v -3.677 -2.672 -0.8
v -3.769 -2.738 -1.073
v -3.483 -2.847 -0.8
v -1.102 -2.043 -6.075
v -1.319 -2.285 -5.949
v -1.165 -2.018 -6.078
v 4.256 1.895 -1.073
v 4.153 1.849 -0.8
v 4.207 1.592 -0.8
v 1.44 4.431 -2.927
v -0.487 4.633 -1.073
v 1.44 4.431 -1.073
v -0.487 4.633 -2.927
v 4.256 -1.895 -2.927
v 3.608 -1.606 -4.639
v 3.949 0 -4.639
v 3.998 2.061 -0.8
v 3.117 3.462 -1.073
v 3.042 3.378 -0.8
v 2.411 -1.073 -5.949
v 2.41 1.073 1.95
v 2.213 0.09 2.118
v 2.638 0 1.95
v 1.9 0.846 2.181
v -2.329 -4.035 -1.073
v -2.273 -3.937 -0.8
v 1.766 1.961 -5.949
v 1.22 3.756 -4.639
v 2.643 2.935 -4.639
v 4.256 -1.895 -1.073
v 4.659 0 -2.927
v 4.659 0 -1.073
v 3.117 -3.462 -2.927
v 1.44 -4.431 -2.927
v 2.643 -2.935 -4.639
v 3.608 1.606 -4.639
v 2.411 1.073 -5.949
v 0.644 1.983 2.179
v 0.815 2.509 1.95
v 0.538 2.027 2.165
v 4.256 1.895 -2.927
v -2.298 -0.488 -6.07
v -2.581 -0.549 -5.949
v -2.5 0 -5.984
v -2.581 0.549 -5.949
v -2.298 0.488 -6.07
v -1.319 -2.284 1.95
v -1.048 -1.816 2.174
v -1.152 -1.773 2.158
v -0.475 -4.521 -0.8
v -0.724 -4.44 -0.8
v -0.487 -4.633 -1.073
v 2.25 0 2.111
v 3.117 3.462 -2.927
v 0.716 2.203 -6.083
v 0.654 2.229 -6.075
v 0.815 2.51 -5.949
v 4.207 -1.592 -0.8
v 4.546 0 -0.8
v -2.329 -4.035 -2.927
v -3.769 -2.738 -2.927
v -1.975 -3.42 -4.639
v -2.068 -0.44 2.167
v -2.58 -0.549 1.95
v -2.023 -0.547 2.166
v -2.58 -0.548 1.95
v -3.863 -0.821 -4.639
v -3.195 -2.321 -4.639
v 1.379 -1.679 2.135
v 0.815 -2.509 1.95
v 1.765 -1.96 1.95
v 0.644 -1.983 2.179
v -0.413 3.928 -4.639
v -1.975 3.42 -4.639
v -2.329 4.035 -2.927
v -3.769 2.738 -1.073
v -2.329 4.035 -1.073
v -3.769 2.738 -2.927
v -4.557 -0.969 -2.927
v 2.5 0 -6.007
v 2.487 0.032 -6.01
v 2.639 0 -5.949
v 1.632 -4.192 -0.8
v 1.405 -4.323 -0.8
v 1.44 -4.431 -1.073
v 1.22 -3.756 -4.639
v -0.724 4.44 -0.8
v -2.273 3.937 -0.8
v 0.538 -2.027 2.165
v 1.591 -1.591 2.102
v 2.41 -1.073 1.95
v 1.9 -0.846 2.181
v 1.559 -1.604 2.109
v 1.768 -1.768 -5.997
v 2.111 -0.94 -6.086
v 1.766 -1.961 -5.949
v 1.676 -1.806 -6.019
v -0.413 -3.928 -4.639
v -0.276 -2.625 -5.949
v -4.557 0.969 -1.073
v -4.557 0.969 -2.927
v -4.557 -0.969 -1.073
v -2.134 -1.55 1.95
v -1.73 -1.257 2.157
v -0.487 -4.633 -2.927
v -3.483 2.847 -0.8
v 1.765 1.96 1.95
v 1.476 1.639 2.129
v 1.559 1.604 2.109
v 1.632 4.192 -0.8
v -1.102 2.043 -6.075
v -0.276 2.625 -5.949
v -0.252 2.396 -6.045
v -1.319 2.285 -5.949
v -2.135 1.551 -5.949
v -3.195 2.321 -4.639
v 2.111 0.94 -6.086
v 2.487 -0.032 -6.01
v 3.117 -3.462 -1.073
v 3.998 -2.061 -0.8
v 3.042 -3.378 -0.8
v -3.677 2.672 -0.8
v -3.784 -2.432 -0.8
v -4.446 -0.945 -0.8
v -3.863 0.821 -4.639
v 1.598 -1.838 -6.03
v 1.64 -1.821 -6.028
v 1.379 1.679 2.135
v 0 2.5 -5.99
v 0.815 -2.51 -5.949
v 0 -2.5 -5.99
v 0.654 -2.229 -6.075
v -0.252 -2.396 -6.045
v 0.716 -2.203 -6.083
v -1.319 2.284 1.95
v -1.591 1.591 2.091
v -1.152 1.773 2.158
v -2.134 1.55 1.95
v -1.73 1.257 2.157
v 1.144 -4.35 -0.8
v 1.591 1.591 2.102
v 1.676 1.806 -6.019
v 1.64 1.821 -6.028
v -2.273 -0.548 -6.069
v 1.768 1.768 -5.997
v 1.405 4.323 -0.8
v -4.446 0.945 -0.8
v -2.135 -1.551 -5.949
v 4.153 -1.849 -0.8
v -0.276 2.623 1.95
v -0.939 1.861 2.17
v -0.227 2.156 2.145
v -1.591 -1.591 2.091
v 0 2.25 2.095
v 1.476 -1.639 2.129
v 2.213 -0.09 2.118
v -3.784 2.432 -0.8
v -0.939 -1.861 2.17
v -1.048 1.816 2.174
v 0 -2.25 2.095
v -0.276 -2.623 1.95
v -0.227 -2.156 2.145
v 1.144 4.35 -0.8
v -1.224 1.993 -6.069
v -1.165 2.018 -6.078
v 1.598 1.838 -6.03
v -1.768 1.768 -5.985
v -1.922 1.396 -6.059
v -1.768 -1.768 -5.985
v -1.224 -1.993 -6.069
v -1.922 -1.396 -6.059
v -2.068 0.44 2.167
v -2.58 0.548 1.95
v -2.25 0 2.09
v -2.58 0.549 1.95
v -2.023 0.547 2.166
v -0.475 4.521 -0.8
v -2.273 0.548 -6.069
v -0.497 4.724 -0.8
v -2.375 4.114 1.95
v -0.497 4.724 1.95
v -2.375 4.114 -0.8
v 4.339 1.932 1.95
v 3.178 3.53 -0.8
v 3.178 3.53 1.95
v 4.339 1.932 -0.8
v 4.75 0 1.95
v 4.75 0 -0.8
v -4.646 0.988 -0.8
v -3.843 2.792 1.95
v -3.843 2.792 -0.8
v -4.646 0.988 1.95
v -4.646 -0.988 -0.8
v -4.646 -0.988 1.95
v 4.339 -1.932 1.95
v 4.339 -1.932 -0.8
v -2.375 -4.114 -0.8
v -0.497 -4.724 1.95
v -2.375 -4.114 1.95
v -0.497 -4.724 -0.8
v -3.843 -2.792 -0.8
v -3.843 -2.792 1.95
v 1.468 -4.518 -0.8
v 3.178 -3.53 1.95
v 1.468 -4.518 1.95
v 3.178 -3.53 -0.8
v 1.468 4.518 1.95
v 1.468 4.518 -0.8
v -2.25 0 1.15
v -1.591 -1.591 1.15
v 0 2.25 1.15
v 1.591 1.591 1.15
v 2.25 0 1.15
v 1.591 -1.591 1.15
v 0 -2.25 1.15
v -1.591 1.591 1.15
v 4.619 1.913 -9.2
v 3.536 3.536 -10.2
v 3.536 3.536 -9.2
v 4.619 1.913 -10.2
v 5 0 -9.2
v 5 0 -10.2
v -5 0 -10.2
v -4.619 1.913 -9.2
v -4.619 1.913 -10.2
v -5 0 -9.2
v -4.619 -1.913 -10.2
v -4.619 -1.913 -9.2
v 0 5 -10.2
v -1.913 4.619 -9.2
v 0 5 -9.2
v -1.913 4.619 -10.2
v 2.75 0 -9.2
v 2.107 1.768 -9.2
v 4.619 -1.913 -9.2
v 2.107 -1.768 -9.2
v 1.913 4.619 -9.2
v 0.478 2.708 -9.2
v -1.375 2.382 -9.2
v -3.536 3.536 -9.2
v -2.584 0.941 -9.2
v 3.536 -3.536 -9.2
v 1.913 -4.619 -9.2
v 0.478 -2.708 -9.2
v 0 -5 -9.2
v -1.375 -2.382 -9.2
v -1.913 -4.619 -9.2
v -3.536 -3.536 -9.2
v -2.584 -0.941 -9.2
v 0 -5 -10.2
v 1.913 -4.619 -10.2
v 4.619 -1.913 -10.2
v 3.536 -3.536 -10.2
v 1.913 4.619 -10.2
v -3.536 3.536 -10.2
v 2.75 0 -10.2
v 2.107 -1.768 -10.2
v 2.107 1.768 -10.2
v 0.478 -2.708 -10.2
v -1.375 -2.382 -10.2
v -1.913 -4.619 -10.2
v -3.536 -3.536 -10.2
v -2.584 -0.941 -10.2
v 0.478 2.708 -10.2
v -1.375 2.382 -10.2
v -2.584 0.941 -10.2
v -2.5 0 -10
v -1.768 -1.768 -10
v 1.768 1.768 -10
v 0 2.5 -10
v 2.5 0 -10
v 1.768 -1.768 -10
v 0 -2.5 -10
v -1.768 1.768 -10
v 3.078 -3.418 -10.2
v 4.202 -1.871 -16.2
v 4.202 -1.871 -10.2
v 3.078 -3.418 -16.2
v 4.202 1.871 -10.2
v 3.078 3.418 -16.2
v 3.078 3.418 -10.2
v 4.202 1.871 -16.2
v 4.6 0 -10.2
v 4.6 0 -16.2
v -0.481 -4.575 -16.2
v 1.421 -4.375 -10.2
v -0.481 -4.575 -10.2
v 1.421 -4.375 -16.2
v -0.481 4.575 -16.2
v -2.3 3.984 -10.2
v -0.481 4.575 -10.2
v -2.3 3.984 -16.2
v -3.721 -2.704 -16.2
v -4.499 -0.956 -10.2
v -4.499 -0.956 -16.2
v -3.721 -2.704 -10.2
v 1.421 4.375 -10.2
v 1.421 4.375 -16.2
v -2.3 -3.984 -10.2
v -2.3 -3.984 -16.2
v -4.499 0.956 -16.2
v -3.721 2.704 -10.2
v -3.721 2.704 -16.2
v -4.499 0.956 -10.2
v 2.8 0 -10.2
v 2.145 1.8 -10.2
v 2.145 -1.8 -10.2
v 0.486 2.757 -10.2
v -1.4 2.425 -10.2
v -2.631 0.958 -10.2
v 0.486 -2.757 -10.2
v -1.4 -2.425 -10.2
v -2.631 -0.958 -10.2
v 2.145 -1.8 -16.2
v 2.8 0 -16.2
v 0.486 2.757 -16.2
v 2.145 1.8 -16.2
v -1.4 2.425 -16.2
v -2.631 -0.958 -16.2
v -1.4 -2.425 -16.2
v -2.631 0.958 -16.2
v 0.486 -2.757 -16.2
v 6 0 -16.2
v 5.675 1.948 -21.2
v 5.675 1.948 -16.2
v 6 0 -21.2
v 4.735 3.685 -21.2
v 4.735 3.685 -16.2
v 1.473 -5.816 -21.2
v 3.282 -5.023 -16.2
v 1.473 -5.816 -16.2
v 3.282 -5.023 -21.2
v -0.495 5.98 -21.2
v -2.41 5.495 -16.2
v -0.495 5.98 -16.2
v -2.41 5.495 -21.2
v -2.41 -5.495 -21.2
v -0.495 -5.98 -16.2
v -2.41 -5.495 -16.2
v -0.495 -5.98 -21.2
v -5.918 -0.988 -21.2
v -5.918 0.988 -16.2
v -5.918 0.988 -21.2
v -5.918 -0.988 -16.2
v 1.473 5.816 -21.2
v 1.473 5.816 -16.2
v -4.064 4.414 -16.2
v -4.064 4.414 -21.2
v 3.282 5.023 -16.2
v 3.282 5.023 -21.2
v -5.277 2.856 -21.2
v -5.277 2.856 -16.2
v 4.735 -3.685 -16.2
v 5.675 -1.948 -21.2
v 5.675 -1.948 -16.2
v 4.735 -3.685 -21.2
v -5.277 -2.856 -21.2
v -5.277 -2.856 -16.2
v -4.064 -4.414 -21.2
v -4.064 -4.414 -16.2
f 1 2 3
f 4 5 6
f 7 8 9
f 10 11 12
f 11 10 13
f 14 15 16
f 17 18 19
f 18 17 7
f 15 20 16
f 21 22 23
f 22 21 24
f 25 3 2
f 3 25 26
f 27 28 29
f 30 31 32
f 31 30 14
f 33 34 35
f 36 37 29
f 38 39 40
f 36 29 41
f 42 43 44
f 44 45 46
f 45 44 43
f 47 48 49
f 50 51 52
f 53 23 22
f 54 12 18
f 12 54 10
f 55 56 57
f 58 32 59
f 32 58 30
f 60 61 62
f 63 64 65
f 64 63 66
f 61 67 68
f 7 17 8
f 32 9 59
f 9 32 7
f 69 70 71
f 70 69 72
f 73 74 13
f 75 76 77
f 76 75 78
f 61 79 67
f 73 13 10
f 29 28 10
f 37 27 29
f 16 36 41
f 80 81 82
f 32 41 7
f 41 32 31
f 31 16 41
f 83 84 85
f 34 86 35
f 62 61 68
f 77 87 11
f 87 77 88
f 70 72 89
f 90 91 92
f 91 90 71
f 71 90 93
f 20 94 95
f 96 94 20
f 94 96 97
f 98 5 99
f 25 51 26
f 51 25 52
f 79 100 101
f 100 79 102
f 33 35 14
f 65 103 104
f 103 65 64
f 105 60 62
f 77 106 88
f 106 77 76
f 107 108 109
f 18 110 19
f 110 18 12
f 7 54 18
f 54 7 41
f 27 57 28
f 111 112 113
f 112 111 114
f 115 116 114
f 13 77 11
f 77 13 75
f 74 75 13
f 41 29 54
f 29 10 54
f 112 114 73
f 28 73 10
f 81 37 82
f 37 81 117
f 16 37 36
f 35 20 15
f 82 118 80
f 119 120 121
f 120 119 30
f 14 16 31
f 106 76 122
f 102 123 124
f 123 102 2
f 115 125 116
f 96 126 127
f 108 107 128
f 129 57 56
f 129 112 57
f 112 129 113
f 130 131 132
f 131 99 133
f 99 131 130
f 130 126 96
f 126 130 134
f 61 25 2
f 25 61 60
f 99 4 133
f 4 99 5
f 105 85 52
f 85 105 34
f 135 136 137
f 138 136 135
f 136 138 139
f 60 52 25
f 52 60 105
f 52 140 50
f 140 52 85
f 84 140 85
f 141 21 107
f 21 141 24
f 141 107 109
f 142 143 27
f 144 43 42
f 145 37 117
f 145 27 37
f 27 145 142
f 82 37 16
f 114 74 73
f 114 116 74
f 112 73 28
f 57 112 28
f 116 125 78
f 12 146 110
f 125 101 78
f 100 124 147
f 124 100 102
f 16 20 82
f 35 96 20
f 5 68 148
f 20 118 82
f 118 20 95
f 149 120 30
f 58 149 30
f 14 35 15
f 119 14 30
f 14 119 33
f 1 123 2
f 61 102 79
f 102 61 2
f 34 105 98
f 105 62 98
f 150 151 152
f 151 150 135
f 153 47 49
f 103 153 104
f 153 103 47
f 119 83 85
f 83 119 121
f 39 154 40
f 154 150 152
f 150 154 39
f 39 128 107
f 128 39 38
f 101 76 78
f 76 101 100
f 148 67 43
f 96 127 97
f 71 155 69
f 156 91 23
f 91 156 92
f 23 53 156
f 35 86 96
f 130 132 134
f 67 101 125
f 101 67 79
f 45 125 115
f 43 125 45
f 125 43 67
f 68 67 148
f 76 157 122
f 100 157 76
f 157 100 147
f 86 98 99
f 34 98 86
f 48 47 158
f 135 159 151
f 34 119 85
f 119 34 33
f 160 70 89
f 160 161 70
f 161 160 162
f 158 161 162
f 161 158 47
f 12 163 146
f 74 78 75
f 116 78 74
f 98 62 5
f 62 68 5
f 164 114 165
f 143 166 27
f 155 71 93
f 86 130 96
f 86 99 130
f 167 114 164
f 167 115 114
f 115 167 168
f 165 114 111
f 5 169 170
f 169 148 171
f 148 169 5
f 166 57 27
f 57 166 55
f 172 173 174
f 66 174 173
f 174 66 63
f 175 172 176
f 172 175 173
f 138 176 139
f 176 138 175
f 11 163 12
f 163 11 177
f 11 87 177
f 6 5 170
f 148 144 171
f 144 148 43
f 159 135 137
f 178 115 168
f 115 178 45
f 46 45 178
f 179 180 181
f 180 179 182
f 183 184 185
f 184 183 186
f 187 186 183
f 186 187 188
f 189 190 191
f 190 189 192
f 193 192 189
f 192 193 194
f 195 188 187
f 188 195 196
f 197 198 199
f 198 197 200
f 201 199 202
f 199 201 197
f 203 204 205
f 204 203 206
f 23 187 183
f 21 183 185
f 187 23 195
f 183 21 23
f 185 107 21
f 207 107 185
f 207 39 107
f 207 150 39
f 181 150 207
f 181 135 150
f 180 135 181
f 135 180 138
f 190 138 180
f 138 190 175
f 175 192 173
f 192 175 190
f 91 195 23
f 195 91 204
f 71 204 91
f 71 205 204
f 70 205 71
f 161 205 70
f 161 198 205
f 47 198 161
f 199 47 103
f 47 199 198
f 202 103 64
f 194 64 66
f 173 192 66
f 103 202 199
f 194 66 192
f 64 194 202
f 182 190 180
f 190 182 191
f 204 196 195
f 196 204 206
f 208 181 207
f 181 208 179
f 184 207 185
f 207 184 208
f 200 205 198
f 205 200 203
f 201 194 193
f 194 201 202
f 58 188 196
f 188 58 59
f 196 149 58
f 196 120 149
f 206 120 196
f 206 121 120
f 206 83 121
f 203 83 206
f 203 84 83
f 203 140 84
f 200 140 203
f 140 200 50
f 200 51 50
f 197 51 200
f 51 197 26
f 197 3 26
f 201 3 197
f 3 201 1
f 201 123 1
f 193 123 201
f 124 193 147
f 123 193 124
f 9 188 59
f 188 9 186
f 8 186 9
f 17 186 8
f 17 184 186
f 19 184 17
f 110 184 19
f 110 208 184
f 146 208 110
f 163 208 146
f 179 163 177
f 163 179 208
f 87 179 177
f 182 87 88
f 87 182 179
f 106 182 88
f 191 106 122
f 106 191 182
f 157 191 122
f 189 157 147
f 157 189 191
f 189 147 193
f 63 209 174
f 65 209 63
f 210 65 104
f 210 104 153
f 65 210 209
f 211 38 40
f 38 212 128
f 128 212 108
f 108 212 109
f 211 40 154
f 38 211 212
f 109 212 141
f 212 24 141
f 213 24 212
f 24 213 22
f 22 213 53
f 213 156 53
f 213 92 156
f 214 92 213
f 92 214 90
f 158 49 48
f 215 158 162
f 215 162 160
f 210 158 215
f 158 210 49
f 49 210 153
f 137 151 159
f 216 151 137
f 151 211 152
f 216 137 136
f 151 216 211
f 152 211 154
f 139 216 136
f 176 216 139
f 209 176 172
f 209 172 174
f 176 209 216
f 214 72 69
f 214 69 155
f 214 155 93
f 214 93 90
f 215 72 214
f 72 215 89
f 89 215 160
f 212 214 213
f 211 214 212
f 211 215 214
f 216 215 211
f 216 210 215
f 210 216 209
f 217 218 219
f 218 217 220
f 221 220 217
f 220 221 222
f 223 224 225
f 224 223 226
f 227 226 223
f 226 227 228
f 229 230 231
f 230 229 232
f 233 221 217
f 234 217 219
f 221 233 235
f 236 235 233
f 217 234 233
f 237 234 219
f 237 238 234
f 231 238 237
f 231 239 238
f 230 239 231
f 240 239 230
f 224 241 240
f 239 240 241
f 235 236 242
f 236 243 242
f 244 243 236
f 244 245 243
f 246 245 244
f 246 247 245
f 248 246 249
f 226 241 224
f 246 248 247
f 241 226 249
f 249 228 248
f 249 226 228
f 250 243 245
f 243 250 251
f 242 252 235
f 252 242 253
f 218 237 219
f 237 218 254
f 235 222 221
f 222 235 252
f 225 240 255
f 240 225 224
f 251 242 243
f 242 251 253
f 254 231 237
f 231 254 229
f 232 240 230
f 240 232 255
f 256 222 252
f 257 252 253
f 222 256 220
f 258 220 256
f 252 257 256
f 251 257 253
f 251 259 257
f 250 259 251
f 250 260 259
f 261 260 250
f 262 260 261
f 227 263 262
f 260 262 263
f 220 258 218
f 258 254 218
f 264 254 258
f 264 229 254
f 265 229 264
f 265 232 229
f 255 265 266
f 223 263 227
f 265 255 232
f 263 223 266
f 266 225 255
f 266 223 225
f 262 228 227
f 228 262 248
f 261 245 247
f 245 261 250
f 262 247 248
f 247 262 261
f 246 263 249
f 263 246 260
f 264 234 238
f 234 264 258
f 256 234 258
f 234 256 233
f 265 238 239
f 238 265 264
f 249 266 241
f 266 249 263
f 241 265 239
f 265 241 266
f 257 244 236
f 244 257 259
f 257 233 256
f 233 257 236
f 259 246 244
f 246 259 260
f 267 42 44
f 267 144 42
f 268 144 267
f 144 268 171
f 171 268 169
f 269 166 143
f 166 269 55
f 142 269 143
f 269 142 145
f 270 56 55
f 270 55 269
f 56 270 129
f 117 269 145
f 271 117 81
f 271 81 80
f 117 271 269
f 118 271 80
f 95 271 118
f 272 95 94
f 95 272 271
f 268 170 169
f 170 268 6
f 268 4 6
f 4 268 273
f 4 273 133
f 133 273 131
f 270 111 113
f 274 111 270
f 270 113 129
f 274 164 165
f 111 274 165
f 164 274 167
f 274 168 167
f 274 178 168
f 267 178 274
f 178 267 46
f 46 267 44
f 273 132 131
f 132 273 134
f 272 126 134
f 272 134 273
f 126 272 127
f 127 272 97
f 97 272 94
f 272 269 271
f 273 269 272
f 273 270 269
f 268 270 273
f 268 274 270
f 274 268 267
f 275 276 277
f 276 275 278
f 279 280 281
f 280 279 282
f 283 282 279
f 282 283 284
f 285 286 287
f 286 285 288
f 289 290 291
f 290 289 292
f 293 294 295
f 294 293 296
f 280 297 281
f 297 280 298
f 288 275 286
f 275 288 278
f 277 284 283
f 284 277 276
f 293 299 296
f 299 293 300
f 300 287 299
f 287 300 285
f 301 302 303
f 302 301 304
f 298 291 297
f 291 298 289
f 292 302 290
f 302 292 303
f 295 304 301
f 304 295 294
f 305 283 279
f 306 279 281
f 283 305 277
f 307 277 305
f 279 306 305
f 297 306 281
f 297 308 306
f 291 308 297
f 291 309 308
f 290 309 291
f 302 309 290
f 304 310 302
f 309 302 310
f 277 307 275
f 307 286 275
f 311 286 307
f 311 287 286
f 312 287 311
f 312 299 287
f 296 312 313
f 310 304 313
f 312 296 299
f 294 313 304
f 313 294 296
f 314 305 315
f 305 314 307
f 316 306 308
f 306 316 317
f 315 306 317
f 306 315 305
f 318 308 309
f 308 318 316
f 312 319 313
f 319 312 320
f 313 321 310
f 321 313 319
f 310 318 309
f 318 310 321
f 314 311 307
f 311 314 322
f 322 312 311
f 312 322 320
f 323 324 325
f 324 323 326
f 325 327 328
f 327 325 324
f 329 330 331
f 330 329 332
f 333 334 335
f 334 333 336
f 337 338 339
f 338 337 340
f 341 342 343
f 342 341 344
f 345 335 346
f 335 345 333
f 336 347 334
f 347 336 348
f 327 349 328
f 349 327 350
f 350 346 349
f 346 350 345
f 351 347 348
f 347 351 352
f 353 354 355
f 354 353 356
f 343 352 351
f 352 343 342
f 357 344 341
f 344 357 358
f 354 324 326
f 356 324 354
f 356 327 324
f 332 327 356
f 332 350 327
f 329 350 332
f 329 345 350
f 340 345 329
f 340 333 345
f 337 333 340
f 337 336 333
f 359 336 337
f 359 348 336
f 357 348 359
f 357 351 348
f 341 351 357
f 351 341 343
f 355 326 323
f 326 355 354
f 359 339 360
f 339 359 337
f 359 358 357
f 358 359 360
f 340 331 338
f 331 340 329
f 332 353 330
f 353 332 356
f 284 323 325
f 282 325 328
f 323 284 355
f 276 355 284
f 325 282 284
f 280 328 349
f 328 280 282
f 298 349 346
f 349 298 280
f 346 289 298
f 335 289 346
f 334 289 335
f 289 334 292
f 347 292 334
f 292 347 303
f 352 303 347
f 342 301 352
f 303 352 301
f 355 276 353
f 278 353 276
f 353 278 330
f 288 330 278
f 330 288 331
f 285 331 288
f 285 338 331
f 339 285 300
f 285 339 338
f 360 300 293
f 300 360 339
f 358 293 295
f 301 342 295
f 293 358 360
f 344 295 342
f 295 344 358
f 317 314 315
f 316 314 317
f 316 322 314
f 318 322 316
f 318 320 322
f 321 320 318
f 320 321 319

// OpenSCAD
// Parameters
thread_major_diameter = 5; //[2.5:10:0.1]
overall_length = 10; //[5:20:0.1]
head_diameter = 9.5; //[5:19:0.1]
head_height = 2.75; //[1.4:5.5:0.05]
thread_length = 10; //[5:20:0.1]
shank_diameter = 5; //[2.5:10:0.1]
transition_height = 0.8; //[0.4:1.6:0.05]
transition_overlap = 0.8; //[0.5:2:0.1]
drive_socket_diameter = 4.5; //[2:7:0.1]
drive_socket_depth = 1.6; //[0.8:3.2:0.05]
washer_outer_diameter = 10; //[6:20:0.1]
washer_thickness = 1; //[0.5:2:0.05]
washer_hole_diameter = 5.5; //[3:11:0.1]
pcb_spacer_height = 6; //[3:12:0.1]
pcb_spacer_wall = 1.8; //[0.9:3.6:0.1]
pcb_spacer_clearance_diameter = 5.6; //[5.2:7:0.1]
buzzer_diameter = 12; //[6:24:0.1]
buzzer_height = 5; //[2.5:10:0.1]

// PCB Spacer - complete geometry
module pcb_spacer() {
  color([0.85, 0.85, 0.8]) {
    difference() {
      cylinder(r=(pcb_spacer_clearance_diameter/2) + pcb_spacer_wall, h=pcb_spacer_height, center=true);
      translate([0, 0, 0])
        cylinder(r=pcb_spacer_clearance_diameter/2, h=pcb_spacer_height + transition_overlap*2, center=true);
    }
  }
}

// Screw and Washer - complete geometry
module screw_and_washer() {
  color("DimGray") {
    union() {
      // Threaded Shaft
      translate([0, 0, -(thread_length/2)])
        cylinder(r=thread_major_diameter/2, h=thread_length, center=true);
      
      // Head to Shank Transition Chamfer
      translate([0, 0, transition_height/2 - transition_overlap])
        cylinder(r1=head_diameter/2, r2=shank_diameter/2, h=transition_height, center=true);
      
      // Dome Head
      difference() {
        union() {
          intersection() {
            translate([0, 0, head_height - head_diameter/2])
              sphere(r=head_diameter/2, center=true);
            translate([0, 0, head_height - head_diameter])
              cube([head_diameter*2, head_diameter*2, head_diameter*2], center=true);
          }
          translate([0, 0, head_height/2 - transition_overlap])
            cylinder(r=head_diameter/2, h=head_height, center=true);
        }
        translate([0, 0, head_height - drive_socket_depth/2])
          cylinder(r=drive_socket_diameter/2, h=drive_socket_depth, center=true);
      }
      
      // Washer
      difference() {
        translate([0, 0, -(thread_length + washer_thickness/2 - transition_overlap)])
          cylinder(r=washer_outer_diameter/2, h=washer_thickness, center=true);
        translate([0, 0, -(thread_length + washer_thickness/2 - transition_overlap)])
          cylinder(r=washer_hole_diameter/2, h=washer_thickness + transition_overlap*2, center=true);
      }
    }
  }
}

// Buzzer - complete geometry
module buzzer() {
  color([0.1, 0.1, 0.6]) {
    translate([0, 0, -(thread_length + washer_thickness + pcb_spacer_height + buzzer_height/2 - transition_overlap)])
      cylinder(r=buzzer_diameter/2, h=buzzer_height, center=true);
  }
}

// Assembly
module assembly() {
  screw_and_washer();
  translate([0, 0, -(thread_length + washer_thickness + pcb_spacer_height/2 - transition_overlap)])
    pcb_spacer();
  buzzer();
}

assembly();
